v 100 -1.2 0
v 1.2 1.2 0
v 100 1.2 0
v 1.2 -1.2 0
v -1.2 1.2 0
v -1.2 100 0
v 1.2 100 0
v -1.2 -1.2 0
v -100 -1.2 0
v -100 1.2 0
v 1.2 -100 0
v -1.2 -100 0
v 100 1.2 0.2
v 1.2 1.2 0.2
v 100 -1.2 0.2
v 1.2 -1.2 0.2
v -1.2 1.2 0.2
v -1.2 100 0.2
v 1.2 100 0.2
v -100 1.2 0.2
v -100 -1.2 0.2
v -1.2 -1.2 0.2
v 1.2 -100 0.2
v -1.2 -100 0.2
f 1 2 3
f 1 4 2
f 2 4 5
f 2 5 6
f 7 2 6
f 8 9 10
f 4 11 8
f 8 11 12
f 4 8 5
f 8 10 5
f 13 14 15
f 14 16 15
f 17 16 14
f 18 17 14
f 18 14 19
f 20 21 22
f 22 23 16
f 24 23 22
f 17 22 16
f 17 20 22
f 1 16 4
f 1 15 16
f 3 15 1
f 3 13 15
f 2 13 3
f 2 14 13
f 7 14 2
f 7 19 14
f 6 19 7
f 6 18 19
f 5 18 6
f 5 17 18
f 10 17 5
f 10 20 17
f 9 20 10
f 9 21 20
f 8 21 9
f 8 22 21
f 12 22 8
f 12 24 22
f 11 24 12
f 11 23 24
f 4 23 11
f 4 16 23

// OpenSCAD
$fa = 1;
$fs = 1.75 / 2;

width = 0.4 * 6;
length = 200;

linear_extrude(0.2) {
    square([length, width], true);

    rotate(90)
    square([length, width], true);
}
